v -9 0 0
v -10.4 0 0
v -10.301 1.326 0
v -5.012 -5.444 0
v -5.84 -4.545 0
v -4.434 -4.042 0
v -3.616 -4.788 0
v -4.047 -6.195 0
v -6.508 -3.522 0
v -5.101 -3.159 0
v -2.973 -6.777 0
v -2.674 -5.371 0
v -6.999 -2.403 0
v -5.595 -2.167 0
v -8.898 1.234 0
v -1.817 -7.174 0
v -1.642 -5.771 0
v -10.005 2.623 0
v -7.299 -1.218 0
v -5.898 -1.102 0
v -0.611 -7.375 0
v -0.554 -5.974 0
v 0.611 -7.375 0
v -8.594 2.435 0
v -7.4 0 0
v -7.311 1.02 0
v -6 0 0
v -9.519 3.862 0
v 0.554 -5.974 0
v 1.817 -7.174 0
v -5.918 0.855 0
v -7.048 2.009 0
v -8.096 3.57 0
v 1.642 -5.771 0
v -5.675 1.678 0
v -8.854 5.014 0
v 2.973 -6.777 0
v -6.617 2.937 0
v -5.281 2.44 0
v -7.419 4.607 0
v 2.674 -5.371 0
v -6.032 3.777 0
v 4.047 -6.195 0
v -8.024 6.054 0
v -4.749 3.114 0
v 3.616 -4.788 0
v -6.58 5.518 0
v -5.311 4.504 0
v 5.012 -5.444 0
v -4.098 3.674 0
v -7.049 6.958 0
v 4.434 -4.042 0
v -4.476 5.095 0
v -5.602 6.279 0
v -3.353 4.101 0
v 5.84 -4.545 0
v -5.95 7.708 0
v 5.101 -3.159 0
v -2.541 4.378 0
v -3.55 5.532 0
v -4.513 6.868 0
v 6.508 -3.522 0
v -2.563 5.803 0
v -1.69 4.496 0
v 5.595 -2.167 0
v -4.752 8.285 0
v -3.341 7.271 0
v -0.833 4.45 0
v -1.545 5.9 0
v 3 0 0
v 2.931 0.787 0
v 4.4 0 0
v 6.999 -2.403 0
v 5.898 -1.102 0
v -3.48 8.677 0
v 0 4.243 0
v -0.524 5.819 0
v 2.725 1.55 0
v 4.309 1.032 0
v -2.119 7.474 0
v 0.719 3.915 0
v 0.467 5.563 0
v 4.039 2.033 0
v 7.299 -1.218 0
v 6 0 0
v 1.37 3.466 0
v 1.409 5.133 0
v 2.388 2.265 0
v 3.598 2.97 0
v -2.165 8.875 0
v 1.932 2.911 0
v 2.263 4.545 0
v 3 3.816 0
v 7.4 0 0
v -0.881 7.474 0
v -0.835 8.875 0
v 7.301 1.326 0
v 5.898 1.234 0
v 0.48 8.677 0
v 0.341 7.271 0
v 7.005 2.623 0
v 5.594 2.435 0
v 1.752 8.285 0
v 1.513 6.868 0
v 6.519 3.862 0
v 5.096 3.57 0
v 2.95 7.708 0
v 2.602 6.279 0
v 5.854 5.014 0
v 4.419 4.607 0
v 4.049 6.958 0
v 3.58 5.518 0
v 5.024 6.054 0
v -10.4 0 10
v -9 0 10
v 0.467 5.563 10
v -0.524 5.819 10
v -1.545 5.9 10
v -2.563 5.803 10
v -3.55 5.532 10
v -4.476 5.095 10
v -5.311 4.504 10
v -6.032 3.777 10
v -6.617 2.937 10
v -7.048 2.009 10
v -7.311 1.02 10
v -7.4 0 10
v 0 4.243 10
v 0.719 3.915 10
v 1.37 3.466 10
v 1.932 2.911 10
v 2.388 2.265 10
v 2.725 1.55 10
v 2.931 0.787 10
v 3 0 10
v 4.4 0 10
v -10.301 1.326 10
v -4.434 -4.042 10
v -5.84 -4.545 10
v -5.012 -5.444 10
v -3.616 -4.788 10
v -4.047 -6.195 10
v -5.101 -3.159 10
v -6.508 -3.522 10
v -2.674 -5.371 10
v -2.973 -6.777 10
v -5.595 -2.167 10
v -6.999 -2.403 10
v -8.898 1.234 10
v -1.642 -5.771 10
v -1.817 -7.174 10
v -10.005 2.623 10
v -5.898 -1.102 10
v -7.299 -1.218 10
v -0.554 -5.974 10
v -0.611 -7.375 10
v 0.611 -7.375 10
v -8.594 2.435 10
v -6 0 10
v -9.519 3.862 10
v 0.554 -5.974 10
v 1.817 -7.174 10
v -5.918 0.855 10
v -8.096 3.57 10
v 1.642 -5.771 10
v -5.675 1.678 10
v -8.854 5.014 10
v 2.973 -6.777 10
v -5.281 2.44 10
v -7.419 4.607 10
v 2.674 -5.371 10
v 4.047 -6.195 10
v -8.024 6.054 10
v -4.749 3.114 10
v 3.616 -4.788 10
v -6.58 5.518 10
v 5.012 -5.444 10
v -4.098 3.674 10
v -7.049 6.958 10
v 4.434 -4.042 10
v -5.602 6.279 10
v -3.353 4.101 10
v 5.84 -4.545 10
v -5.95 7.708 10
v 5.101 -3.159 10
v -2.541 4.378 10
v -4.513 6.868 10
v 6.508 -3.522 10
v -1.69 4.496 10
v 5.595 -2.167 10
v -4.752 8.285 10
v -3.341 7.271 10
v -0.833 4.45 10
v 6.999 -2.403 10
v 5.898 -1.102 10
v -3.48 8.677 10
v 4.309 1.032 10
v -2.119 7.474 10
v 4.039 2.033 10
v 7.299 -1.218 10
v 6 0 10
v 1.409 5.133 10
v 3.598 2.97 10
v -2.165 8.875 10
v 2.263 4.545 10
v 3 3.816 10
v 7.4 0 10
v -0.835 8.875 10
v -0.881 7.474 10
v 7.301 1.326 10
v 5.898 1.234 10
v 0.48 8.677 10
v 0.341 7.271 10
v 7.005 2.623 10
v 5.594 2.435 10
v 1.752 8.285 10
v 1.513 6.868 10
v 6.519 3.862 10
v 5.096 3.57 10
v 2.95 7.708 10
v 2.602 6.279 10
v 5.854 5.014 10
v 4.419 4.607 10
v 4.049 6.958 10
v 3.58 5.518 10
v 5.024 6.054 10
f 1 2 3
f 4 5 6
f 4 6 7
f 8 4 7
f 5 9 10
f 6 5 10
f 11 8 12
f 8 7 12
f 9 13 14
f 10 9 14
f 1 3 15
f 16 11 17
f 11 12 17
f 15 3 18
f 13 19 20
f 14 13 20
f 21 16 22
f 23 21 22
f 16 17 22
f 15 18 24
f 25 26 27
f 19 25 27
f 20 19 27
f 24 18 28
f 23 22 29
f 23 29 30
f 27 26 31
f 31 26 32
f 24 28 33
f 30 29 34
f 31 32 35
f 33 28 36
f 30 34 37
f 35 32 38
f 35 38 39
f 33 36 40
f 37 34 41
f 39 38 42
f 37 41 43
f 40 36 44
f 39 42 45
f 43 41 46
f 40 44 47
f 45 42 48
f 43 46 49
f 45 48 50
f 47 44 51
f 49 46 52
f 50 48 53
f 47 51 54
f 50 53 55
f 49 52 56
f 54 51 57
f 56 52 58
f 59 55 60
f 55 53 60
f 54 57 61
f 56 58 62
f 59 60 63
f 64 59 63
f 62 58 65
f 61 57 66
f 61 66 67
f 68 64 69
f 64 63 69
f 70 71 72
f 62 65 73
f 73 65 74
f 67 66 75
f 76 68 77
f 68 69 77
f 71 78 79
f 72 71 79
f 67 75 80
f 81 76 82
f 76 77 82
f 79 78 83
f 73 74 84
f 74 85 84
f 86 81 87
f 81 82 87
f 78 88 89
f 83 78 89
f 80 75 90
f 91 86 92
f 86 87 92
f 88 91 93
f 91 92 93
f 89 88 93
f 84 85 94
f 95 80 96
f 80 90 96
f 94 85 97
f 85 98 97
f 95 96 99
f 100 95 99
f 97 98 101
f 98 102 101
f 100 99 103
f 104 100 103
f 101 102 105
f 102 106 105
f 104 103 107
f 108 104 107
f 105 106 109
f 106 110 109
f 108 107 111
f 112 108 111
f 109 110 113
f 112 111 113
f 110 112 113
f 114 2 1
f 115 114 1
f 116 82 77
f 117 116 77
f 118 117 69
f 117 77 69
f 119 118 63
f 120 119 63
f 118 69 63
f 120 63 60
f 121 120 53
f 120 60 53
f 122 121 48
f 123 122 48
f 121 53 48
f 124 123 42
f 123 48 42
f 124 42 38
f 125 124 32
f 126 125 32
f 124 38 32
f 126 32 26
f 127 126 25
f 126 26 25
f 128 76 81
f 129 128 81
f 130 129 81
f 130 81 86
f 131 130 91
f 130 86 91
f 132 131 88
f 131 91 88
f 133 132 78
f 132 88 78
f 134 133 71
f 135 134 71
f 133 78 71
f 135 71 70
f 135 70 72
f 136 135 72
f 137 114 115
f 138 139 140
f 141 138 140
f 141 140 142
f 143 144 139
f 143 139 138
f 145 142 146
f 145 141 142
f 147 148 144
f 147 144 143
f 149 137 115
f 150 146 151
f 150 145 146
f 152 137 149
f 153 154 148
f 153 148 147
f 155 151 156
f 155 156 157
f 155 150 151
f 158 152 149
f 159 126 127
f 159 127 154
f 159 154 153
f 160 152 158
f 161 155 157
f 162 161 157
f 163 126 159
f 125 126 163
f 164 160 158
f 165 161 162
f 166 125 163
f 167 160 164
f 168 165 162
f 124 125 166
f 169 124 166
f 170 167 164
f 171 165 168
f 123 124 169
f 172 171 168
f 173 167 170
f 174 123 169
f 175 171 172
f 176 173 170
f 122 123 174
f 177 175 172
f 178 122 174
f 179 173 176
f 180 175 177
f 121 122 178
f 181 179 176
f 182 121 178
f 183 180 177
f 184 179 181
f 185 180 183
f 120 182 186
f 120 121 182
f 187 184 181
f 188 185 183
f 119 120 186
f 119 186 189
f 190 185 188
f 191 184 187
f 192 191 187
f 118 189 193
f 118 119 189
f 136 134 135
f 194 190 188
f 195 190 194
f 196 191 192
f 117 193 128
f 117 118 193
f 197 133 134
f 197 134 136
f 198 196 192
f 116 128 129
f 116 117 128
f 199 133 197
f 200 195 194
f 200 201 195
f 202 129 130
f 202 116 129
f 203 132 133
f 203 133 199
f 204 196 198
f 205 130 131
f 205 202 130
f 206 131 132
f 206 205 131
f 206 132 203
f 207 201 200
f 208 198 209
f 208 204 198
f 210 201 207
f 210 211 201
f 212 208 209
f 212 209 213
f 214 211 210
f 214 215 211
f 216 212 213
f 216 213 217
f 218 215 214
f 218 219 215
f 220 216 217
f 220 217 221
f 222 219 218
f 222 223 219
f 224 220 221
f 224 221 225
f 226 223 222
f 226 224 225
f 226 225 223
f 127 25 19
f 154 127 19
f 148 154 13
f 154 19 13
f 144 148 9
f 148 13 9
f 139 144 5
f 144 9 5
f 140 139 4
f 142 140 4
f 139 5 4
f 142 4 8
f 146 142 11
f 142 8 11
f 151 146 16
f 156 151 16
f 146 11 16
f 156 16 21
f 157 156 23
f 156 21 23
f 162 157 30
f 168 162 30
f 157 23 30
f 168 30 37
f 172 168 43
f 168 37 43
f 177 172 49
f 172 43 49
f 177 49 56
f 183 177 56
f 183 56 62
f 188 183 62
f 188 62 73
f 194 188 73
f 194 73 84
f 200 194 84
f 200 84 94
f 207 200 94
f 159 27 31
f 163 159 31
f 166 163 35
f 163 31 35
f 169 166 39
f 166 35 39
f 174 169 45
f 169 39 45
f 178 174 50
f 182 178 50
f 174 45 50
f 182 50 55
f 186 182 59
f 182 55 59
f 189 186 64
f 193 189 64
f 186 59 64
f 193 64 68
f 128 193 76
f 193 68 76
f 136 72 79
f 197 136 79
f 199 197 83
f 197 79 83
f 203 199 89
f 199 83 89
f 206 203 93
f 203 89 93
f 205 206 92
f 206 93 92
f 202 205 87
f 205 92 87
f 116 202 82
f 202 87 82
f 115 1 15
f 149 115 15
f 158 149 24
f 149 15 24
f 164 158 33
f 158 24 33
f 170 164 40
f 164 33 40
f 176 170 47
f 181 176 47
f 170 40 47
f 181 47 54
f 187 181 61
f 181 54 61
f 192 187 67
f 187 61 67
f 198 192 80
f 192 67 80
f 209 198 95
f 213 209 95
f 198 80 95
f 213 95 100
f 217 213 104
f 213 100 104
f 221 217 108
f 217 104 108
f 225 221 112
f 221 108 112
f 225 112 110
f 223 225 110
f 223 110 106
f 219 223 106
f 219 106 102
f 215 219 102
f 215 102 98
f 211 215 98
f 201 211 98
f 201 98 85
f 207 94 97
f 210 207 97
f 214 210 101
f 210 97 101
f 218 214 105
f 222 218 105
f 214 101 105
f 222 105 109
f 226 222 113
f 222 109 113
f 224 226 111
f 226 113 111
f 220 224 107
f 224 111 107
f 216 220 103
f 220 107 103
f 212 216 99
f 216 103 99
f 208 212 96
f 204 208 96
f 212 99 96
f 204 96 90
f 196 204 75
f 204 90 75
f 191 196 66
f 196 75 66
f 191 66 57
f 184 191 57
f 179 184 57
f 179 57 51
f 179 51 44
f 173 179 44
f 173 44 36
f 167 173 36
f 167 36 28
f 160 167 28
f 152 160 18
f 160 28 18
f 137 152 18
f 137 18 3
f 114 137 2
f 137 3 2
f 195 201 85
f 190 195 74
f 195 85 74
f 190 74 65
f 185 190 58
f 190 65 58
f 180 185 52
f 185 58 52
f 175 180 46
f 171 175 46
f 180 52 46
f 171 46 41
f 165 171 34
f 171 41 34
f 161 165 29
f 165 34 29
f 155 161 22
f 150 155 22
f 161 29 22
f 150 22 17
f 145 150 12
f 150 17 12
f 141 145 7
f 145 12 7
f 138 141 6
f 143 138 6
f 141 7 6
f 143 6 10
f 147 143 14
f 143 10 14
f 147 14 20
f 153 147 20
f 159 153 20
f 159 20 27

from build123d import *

# Parameters (mm, degrees)
F1_DEPTH = 10


with BuildPart() as f1:
    # F0 (on Top) → F1 (new body)
    with BuildSketch(Plane.XY):
        with BuildLine():
            ThreePointArc((0, 4.242641), (2.174235, 2.598076), (3, 0))
            Line((3, 0), (4.4, 0))
            ThreePointArc((4.4, 0), (3.31733, 3.406367), (0.466667, 5.562573))
            ThreePointArc((0.466667, 5.562573), (-4.906367, 4.81733), (-7.4, 0))
            ThreePointArc((-7.4, 0), (0, -7.4), (7.4, 0))
            ThreePointArc((7.4, 0), (-1.5, 8.9), (-10.4, 0))
            Line((-10.4, 0), (-9, 0))
            ThreePointArc((-9, 0), (-1.5, 7.5), (6, 0))
            ThreePointArc((6, 0), (0, -6), (-6, 0))
            ThreePointArc((-6, 0), (-4.098076, 3.674235), (0, 4.242641))
        make_face()
    extrude(amount=F1_DEPTH)


solid = f1.part
